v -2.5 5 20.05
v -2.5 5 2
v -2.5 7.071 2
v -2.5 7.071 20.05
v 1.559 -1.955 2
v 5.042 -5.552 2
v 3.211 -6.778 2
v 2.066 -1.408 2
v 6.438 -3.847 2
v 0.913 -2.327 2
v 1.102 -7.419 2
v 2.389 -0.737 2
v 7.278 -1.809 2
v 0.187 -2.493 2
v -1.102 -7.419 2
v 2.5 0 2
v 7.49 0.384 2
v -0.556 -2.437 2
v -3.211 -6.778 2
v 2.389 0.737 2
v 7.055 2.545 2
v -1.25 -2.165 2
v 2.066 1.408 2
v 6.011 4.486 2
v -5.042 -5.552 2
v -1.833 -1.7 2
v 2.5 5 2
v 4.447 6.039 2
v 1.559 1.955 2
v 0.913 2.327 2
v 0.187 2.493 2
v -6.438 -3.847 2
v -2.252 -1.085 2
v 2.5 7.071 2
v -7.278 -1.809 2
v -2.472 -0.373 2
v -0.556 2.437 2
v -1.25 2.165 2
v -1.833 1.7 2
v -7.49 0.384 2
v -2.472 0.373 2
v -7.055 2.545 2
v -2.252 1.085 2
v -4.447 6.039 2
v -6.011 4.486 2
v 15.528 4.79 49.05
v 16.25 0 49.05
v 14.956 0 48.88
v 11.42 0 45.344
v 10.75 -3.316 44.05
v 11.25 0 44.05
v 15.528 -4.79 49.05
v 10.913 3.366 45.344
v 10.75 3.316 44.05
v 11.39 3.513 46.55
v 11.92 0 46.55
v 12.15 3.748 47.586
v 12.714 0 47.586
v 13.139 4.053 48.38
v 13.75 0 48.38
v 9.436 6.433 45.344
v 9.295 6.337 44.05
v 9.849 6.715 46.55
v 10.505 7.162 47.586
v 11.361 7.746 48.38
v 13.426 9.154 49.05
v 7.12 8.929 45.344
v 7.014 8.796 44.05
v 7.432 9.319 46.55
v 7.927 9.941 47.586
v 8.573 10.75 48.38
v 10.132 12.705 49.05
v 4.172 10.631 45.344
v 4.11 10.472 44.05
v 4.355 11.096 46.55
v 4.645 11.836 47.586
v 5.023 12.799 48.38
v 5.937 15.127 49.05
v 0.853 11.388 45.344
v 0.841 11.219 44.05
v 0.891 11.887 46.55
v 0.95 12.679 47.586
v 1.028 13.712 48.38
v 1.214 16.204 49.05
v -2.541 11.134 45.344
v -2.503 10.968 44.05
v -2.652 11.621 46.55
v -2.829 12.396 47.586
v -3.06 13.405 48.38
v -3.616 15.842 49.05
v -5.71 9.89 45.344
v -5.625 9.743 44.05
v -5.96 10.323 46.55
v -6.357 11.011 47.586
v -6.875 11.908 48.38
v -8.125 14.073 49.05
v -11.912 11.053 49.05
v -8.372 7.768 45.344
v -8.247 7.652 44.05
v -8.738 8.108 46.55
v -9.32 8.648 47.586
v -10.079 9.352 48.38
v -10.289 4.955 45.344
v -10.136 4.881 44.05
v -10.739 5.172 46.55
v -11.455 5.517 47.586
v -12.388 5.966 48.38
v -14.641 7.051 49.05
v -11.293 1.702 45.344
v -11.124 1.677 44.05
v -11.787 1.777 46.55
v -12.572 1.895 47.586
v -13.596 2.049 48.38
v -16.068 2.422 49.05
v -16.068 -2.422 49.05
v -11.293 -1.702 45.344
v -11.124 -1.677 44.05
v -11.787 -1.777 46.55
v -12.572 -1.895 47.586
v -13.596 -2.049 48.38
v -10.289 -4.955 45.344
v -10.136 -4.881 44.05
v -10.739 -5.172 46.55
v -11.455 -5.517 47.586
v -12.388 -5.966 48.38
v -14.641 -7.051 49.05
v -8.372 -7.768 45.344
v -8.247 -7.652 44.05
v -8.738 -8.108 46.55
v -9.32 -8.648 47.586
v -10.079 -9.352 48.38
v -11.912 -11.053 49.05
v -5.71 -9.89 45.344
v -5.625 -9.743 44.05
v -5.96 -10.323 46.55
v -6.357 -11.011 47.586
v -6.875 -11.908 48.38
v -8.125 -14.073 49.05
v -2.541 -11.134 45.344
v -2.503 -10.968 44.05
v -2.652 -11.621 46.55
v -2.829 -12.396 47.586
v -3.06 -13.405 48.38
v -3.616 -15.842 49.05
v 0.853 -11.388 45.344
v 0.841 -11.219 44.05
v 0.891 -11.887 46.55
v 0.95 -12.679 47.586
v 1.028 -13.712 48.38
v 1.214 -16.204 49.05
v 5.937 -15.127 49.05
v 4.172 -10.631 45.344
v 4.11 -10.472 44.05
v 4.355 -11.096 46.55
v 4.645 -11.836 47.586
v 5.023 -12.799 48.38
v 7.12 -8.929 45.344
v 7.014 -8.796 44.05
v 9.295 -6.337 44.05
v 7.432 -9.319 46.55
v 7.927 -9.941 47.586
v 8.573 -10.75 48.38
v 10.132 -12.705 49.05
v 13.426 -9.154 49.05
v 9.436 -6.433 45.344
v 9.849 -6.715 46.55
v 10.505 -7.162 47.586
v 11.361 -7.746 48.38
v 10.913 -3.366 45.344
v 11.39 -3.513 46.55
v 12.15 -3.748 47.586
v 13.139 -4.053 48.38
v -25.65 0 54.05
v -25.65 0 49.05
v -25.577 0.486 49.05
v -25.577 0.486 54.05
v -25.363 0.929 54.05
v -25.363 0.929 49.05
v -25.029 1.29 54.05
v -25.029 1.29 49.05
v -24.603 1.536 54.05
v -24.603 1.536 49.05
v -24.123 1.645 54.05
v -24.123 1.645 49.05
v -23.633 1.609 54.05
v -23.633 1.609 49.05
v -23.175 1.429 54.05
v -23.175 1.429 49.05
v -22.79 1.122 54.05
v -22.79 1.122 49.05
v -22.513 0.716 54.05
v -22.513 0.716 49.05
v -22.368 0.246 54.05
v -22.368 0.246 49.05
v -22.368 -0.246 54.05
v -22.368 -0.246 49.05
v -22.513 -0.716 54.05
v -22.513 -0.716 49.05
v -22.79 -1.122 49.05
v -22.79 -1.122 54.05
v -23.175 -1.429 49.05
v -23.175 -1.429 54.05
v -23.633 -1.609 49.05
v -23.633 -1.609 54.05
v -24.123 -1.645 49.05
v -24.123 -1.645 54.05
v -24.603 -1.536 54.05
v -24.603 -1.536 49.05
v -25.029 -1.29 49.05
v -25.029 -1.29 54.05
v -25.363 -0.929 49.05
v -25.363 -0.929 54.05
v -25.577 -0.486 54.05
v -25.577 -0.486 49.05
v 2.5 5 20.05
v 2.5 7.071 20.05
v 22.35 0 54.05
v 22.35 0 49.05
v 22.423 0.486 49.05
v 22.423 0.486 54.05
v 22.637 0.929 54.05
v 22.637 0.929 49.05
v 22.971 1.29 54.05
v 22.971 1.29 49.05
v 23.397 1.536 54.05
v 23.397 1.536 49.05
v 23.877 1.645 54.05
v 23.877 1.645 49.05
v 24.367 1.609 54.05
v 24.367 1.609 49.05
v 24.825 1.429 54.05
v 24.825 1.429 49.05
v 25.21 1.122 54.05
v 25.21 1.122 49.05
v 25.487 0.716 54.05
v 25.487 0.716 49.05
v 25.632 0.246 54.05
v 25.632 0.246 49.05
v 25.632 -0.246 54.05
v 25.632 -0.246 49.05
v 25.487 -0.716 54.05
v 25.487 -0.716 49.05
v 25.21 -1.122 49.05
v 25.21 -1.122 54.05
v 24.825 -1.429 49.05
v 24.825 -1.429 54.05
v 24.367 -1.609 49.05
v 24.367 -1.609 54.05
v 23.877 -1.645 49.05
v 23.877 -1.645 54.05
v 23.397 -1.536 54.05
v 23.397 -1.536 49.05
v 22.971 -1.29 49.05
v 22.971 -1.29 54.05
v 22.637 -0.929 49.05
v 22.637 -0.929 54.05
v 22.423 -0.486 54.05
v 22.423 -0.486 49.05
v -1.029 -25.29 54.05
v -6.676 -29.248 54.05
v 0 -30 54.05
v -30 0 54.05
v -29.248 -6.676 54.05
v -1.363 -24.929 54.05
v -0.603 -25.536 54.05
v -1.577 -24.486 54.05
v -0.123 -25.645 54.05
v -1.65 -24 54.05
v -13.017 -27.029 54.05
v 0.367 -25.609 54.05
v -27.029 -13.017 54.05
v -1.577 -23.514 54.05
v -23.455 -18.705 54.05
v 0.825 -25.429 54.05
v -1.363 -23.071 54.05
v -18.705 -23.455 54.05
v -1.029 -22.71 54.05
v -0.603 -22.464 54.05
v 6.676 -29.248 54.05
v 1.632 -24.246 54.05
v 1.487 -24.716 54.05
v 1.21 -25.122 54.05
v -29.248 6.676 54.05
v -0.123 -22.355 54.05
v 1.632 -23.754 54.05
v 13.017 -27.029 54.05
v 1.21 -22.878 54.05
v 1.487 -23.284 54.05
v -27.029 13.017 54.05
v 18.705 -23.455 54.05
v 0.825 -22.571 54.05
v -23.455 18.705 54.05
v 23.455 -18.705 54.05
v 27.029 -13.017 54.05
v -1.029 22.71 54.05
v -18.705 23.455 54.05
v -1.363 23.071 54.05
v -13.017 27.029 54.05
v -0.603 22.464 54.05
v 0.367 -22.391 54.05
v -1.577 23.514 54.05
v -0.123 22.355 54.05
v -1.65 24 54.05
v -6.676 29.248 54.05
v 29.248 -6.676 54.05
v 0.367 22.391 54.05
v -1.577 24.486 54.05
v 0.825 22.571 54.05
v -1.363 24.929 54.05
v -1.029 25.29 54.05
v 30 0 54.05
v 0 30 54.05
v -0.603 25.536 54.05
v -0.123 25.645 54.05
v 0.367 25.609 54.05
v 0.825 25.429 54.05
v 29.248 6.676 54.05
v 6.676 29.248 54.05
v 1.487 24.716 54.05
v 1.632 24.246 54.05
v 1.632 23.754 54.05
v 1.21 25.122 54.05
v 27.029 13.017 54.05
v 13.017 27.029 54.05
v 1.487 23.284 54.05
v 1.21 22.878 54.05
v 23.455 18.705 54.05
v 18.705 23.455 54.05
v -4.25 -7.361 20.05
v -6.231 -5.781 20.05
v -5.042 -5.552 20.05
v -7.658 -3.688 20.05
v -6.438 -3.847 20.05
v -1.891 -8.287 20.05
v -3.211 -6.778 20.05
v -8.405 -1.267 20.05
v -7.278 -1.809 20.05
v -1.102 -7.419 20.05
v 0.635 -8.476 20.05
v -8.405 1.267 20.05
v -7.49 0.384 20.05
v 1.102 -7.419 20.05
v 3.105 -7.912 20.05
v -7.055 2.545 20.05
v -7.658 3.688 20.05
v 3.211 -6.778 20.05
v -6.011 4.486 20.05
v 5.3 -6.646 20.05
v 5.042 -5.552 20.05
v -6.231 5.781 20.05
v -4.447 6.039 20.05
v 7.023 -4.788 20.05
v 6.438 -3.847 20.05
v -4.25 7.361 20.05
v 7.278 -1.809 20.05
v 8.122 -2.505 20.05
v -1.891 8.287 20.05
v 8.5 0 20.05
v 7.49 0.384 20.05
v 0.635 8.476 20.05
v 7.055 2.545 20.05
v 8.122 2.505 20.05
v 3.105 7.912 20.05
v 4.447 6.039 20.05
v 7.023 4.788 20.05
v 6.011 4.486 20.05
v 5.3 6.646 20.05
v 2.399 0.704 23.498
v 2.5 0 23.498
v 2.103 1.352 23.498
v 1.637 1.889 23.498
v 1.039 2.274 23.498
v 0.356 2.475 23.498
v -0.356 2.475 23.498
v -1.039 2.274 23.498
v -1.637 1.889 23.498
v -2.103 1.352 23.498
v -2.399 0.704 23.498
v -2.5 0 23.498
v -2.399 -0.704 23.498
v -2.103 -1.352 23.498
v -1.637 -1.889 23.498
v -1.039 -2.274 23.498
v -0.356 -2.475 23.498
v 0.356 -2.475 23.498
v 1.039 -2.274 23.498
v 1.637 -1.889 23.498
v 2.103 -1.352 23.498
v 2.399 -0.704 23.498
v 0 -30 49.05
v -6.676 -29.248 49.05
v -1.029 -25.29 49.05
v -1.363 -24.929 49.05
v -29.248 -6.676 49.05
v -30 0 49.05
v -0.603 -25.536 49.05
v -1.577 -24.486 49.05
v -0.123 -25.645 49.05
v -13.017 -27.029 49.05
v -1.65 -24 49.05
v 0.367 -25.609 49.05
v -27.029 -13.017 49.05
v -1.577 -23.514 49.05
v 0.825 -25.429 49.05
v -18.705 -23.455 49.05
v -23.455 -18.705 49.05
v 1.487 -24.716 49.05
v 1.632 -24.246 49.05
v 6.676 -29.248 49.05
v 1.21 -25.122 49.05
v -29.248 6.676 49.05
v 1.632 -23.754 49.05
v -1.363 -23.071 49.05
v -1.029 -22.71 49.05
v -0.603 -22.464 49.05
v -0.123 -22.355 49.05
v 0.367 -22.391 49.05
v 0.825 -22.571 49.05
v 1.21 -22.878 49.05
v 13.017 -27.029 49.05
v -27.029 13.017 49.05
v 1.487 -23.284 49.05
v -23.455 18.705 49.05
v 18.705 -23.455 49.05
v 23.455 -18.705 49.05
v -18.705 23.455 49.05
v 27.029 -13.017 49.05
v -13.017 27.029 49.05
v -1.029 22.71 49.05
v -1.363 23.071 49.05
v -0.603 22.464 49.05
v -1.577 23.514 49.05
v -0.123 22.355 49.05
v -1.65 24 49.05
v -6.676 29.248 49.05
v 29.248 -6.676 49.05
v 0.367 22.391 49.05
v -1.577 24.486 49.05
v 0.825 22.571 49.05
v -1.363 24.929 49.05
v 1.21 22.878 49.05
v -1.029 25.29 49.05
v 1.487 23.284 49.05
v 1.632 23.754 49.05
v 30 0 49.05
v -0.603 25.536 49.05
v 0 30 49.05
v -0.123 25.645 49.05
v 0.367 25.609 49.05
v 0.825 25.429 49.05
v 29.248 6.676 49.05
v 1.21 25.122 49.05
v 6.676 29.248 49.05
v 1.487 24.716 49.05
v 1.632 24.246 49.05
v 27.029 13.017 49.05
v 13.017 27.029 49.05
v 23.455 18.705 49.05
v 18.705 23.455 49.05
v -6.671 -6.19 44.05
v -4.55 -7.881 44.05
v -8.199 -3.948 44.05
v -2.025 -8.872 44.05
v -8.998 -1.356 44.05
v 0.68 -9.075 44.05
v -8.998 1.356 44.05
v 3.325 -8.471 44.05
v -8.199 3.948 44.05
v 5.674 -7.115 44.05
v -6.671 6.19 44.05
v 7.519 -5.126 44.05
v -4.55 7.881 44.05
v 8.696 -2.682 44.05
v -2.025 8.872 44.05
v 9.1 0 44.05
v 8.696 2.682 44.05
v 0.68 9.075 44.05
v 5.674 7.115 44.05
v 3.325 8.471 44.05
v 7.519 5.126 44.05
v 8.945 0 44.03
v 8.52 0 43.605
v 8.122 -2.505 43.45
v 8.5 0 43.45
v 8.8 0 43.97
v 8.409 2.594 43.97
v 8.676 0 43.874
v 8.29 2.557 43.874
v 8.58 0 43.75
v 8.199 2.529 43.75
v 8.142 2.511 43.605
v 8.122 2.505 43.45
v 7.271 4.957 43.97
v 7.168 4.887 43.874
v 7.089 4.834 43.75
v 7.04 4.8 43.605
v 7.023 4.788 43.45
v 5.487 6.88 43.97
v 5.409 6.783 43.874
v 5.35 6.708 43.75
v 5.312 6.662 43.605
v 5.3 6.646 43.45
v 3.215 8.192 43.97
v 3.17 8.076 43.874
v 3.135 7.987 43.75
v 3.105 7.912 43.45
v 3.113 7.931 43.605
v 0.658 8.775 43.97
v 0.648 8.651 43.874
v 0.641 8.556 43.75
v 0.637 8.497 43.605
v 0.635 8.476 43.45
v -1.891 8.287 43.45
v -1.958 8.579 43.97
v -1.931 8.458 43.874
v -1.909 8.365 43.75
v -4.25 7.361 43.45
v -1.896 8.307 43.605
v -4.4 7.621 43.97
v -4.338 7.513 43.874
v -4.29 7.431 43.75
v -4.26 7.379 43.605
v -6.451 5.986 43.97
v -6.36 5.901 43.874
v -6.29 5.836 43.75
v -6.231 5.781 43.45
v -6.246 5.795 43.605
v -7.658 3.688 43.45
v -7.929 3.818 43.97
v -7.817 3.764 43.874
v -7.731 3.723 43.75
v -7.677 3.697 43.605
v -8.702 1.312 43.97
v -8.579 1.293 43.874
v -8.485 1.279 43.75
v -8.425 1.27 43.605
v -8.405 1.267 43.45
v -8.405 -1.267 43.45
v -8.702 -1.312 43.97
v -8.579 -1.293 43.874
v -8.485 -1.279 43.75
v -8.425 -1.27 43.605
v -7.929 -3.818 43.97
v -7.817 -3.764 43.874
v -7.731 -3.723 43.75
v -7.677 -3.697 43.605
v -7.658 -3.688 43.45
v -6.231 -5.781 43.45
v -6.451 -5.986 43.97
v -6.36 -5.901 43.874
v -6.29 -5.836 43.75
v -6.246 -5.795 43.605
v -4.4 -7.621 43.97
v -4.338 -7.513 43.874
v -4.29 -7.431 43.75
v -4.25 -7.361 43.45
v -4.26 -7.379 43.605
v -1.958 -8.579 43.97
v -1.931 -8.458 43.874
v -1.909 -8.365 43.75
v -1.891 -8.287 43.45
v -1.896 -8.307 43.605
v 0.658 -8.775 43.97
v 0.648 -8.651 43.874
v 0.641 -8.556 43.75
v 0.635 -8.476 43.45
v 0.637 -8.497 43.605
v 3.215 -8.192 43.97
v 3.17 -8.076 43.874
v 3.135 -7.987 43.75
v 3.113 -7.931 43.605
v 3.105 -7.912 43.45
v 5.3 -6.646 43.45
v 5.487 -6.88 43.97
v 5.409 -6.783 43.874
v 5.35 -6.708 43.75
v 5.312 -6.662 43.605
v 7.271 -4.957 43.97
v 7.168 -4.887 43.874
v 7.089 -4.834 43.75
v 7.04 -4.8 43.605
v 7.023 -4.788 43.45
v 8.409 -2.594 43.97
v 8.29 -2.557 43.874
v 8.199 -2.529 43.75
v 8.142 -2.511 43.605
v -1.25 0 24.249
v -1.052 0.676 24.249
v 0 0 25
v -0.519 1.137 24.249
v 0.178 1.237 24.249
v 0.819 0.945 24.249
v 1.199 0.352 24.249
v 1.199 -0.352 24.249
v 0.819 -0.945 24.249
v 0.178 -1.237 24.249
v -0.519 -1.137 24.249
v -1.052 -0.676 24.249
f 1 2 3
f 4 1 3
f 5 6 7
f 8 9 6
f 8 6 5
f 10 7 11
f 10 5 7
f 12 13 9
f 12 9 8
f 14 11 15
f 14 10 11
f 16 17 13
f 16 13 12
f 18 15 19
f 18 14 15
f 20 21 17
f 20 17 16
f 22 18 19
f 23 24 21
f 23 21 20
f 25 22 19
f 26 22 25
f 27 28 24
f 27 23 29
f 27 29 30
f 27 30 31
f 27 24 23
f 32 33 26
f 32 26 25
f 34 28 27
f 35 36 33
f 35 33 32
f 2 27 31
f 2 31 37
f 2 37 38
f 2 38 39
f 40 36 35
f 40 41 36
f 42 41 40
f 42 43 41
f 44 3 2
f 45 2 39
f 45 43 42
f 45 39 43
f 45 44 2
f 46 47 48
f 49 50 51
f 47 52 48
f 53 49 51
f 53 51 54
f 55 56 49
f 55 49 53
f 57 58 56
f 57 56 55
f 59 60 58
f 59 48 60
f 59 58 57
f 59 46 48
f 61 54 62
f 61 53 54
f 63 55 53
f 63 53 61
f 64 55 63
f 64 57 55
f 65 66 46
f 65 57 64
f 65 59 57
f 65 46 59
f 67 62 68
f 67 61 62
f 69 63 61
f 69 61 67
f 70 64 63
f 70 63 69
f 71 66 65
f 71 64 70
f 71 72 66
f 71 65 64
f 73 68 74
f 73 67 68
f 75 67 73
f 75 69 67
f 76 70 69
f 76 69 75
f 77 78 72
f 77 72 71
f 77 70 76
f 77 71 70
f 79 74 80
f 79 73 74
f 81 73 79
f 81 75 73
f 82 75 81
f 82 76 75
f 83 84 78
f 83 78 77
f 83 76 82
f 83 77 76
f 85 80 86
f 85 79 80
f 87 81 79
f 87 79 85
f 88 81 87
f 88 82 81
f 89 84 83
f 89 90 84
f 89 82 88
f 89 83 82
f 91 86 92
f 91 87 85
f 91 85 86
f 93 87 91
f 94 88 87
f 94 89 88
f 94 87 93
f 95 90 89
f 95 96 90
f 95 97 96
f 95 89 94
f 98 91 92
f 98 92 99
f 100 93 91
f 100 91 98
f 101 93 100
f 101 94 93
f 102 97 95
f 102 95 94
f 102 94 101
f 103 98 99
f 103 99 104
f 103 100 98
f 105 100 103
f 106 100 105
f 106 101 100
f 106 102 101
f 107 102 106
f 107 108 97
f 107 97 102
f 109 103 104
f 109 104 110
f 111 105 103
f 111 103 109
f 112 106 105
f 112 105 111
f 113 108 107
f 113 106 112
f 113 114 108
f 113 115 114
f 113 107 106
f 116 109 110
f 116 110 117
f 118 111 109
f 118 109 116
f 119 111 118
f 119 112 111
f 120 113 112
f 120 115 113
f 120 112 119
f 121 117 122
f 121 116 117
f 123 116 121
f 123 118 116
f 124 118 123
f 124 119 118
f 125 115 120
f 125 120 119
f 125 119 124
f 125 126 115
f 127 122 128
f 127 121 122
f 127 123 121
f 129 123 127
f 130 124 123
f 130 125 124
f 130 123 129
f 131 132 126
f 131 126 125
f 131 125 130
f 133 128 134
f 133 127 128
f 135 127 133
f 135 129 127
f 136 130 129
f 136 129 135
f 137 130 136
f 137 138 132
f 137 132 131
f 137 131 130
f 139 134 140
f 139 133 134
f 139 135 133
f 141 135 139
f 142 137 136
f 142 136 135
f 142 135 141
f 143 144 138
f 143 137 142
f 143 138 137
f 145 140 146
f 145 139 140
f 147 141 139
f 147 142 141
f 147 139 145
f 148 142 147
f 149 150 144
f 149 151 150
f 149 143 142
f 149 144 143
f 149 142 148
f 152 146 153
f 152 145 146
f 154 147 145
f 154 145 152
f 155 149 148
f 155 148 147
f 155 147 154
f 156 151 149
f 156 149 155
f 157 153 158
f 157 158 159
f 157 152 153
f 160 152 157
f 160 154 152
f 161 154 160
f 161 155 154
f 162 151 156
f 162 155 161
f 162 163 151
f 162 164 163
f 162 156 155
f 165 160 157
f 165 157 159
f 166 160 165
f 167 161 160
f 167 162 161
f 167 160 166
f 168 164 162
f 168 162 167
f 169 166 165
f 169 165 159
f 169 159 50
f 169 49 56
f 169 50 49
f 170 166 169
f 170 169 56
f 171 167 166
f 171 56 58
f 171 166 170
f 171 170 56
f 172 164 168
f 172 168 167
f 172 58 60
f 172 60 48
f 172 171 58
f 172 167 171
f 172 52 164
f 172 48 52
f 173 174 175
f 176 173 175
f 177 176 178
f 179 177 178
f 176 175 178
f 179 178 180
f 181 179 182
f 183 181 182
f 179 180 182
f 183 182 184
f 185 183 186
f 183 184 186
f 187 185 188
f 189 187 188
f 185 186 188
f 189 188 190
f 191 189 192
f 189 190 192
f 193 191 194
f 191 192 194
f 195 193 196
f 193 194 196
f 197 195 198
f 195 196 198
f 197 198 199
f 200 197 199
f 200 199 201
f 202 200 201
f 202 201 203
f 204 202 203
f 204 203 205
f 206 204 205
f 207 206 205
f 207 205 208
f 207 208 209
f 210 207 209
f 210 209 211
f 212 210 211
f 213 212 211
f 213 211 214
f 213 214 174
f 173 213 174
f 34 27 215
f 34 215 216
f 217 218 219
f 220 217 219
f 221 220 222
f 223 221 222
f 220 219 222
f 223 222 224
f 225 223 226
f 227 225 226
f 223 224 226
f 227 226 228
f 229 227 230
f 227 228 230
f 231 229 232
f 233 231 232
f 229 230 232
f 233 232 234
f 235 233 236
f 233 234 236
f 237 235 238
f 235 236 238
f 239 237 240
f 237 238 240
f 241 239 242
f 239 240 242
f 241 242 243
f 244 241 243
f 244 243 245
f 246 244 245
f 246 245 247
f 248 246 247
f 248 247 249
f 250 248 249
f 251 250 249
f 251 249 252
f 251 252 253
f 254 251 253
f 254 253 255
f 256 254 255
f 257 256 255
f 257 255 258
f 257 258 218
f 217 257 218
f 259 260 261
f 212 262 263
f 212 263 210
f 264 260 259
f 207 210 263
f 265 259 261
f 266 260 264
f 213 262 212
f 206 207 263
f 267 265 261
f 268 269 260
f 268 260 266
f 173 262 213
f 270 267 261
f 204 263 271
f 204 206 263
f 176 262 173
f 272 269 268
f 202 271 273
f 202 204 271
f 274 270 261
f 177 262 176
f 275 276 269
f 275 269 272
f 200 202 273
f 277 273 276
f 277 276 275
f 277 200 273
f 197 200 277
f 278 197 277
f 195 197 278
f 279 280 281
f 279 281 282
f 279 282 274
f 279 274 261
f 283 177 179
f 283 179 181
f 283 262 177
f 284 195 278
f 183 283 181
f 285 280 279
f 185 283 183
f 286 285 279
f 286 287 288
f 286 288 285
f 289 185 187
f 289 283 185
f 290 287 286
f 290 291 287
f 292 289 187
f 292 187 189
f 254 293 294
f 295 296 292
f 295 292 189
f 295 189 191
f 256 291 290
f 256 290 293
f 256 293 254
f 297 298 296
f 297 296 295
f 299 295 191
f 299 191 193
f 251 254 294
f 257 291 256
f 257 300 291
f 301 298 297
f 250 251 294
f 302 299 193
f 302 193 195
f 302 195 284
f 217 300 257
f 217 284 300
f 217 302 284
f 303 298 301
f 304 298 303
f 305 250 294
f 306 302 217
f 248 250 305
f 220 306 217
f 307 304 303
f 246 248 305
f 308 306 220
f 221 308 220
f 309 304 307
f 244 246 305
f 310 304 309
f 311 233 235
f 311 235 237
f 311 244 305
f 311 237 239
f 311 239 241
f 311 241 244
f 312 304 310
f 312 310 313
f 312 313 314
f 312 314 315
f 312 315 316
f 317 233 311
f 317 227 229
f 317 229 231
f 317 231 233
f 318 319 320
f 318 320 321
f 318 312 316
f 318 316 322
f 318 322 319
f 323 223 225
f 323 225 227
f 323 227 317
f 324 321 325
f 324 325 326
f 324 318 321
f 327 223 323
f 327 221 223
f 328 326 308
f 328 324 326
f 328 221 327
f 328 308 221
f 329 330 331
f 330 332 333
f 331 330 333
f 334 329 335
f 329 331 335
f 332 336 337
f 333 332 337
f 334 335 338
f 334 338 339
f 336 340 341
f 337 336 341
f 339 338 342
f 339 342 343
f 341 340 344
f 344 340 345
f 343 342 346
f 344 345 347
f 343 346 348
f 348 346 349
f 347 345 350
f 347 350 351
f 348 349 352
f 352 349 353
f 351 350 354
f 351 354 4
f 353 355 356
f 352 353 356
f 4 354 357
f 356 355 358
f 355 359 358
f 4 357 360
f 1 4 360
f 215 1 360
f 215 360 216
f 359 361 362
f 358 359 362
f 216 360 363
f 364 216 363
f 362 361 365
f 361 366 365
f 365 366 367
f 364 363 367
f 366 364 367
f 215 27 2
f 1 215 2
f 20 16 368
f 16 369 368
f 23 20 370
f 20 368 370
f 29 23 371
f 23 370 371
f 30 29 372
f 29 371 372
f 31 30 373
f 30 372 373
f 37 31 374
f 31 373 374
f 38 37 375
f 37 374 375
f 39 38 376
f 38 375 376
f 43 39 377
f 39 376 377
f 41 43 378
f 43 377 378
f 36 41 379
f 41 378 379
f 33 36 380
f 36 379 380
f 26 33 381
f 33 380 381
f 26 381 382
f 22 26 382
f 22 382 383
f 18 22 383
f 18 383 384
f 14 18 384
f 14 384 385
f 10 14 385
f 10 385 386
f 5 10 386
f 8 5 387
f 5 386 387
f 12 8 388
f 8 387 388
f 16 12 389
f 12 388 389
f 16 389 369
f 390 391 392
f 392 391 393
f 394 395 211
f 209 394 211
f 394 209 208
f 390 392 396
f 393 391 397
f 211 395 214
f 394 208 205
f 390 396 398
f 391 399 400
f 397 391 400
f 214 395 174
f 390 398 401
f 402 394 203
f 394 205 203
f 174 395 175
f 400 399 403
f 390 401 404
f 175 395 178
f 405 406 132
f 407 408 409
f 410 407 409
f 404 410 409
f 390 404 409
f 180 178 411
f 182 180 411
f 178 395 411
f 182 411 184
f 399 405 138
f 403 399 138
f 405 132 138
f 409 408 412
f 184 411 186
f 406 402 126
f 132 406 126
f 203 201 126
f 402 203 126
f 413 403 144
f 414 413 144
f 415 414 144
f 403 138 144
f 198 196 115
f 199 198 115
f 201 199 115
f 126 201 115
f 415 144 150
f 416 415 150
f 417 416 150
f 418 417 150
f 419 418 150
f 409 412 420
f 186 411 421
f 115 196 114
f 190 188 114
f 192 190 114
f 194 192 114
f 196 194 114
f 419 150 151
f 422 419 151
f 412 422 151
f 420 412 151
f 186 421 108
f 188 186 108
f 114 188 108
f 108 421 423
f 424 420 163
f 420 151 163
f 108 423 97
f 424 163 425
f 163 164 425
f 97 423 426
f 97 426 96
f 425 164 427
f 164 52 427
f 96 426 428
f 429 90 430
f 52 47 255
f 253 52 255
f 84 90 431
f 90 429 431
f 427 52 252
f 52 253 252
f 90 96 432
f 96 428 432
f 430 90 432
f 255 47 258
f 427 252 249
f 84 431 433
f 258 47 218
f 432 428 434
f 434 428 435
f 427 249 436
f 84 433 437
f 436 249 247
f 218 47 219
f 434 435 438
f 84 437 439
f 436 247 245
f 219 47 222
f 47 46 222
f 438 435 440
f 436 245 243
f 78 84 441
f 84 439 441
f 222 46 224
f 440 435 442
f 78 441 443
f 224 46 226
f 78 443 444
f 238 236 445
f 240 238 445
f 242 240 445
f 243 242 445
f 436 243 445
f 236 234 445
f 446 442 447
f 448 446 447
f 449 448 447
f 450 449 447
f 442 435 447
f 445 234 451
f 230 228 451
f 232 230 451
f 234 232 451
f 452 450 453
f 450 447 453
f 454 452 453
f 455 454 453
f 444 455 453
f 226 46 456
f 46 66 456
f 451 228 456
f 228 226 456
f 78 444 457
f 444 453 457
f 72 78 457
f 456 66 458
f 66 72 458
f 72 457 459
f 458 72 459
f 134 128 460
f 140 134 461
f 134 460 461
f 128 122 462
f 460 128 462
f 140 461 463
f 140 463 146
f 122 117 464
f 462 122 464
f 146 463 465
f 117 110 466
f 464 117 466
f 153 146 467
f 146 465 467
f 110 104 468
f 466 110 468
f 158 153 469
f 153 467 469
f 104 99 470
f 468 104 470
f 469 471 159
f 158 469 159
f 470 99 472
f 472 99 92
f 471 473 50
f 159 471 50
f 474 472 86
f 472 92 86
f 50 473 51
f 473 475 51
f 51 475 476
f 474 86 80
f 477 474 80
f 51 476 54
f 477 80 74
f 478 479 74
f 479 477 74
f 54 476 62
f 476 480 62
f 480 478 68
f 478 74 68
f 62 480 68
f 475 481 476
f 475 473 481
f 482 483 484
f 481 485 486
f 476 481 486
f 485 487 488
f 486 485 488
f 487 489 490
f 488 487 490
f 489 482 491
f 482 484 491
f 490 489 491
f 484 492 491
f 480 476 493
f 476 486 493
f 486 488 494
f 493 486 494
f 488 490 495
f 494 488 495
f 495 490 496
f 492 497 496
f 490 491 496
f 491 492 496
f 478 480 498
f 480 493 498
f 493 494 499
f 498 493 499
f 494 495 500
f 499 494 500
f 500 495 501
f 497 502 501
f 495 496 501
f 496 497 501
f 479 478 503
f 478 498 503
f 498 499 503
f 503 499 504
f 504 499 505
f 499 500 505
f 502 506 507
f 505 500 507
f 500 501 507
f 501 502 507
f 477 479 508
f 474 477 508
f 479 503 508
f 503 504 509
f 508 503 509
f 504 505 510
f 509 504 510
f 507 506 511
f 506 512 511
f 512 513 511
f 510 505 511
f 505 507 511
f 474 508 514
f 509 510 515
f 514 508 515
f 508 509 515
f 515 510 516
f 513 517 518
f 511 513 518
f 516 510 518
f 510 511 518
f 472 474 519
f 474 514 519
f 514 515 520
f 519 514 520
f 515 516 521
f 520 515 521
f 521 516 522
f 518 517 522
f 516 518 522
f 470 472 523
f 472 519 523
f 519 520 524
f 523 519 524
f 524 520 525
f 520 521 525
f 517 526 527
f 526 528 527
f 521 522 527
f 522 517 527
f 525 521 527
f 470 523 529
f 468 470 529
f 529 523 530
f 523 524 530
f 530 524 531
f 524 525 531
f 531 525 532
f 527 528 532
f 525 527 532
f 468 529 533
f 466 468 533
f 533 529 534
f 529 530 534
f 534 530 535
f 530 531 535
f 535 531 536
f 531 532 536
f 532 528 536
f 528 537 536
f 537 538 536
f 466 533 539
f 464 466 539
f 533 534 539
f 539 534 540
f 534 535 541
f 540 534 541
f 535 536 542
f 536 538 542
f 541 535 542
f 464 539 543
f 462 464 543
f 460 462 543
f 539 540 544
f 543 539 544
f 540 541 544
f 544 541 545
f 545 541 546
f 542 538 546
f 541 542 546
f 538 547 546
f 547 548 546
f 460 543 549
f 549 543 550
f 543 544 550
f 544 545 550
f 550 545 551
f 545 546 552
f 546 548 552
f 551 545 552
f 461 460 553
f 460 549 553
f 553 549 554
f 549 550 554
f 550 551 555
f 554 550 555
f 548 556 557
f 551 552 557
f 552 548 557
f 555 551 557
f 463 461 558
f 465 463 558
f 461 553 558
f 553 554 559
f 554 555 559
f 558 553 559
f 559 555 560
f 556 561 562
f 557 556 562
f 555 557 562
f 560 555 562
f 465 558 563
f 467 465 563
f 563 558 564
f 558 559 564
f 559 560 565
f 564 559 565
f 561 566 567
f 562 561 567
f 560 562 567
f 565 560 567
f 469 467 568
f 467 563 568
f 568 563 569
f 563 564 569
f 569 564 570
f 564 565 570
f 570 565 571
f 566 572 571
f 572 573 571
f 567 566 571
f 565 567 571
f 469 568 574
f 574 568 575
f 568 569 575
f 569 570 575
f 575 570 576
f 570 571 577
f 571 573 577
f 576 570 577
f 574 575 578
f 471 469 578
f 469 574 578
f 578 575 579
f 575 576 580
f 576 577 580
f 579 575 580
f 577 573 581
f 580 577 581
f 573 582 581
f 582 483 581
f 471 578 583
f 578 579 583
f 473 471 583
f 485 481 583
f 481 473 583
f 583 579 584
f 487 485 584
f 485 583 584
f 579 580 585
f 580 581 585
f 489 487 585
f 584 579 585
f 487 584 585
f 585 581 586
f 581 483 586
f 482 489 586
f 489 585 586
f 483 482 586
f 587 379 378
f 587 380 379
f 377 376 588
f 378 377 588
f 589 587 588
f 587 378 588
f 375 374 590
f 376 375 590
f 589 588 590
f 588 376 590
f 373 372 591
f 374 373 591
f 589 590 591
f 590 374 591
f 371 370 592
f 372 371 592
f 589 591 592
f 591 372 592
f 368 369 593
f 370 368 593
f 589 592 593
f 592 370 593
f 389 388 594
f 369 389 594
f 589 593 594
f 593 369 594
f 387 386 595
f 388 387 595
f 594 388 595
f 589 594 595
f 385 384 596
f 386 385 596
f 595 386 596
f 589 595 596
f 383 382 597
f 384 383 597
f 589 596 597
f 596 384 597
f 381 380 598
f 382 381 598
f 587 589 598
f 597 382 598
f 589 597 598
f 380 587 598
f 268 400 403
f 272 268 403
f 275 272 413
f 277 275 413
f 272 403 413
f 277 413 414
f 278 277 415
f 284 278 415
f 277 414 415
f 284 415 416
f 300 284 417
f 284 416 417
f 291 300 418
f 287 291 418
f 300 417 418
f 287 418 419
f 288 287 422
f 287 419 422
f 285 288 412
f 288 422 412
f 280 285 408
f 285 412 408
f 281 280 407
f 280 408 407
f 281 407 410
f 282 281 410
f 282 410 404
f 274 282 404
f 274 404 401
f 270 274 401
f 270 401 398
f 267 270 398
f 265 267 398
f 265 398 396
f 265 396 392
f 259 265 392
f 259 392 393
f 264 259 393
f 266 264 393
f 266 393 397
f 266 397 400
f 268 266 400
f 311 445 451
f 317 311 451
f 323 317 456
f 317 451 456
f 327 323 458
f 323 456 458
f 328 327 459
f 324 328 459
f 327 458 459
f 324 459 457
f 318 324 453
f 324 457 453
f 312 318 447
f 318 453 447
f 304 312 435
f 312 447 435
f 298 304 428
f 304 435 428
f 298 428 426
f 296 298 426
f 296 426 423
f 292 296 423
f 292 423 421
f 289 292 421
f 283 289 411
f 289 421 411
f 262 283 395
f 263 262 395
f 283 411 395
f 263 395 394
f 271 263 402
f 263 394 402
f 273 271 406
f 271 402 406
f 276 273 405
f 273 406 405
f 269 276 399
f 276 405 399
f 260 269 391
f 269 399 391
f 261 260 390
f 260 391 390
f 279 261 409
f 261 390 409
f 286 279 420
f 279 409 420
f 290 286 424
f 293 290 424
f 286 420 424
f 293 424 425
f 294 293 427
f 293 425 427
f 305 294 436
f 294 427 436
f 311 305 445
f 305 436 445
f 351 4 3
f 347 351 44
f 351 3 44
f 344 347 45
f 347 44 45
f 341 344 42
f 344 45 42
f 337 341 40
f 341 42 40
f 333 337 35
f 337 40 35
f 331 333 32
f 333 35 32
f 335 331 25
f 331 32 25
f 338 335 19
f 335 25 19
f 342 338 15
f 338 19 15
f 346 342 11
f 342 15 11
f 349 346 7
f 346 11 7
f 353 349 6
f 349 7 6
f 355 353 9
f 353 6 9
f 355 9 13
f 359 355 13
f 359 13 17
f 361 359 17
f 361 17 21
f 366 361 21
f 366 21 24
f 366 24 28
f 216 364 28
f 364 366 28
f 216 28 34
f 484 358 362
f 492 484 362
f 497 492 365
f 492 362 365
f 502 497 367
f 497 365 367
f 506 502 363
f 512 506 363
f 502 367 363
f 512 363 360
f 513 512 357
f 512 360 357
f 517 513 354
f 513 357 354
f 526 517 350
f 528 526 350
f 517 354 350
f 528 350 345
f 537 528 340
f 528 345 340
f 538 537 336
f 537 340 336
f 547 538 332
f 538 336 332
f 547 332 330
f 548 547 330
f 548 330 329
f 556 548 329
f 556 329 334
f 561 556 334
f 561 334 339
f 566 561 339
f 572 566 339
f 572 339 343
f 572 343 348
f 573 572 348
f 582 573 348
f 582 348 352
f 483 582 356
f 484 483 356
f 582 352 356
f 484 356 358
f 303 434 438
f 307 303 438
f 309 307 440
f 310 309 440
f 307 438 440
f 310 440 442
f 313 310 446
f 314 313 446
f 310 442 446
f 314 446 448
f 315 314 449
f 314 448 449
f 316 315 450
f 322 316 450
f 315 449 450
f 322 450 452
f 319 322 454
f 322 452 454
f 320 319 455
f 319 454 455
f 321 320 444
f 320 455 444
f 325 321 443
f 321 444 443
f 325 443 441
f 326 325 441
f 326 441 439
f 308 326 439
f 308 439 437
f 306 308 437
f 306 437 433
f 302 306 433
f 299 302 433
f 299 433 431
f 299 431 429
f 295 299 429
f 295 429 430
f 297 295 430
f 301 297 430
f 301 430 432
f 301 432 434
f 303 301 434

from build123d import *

# Parameters (mm, degrees)
SKETCH1_R                 = 7.5
BOSS_EXTRUDE1_DEPTH       = 20.05
SKETCH3_W                 = 5
SKETCH3_H                 = 5
CUT_EXTRUDE1_DEPTH        = 21
SKETCH6_R                 = 8.5
BOSS_EXTRUDE2_DEPTH       = 24
SKETCH7_R                 = 11.25
BOSS_EXTRUDE3_DEPTH       = 5
SKETCH8_R                 = 30
BOSS_EXTRUDE4_DEPTH       = 5
FILLET1_R                 = 0.6
FILLET2_R                 = 5
M4X0_7_TAPPED_HOLE1_D     = 3.3
M6X1_0_TAPPED_HOLE2_D     = 5
M6X1_0_TAPPED_HOLE2_DEPTH = 23.497848452
M6X1_0_TAPPED_HOLE2_TIP   = 1.502151548
SKETCH13_R                = 7.5
CUT_EXTRUDE2_DEPTH        = 2


with BuildPart() as part:
    # Sketch1 → Boss-Extrude1 (new body)
    with BuildSketch(Plane.XY):
        Circle(SKETCH1_R)
    extrude(amount=BOSS_EXTRUDE1_DEPTH)

    # Sketch3 → Cut-Extrude1 (cut)
    with BuildSketch(Plane(origin=(0, 0, 0), x_dir=(-1, 0, 0), z_dir=(0, 0, -1))):
        with Locations((0, 7.5)):
            Rectangle(SKETCH3_W, SKETCH3_H)
    extrude(amount=-CUT_EXTRUDE1_DEPTH, mode=Mode.SUBTRACT)

    # Sketch6 → Boss-Extrude2 (add)
    with BuildSketch(Plane.XY.offset(20.05)):
        Circle(SKETCH6_R)
    extrude(amount=BOSS_EXTRUDE2_DEPTH)

    # Sketch7 → Boss-Extrude3 (add)
    with BuildSketch(Plane.XY.offset(44.05)):
        Circle(SKETCH7_R)
    extrude(amount=BOSS_EXTRUDE3_DEPTH)

    # Sketch8 → Boss-Extrude4 (add)
    with BuildSketch(Plane.XY.offset(49.05)):
        Circle(SKETCH8_R)
    extrude(amount=BOSS_EXTRUDE4_DEPTH)

    # Fillet1
    fillet1_edges = [part.edges().sort_by_distance(p)[0] for p in [
        (-8.5, 0, 44.05),
    ]]
    fillet(fillet1_edges, radius=FILLET1_R)

    # Fillet2
    fillet2_edges = [part.edges().sort_by_distance(p)[0] for p in [
        (-11.25, 0, 49.05),
    ]]
    fillet(fillet2_edges, radius=FILLET2_R - 0.0001)  # a hair under: the kernel refuses the full size

    # M4x0.7 Tapped Hole1 (through all)
    with Locations(Plane.XY.offset(54.05)):
        with Locations((0, 24), (0, -24), (24, 0), (-24, 0)):
            Hole(M4X0_7_TAPPED_HOLE1_D / 2)

    # M6x1.0 Tapped Hole2
    with Locations(Plane(origin=(0, 0, 0), x_dir=(-1, 0, 0), z_dir=(0, 0, -1))):
        with Locations((0, 0)):
            Hole(M6X1_0_TAPPED_HOLE2_D / 2, depth=M6X1_0_TAPPED_HOLE2_DEPTH)
            with Locations((0, 0, -(M6X1_0_TAPPED_HOLE2_DEPTH + M6X1_0_TAPPED_HOLE2_TIP / 2))):  # 118° drill point
                Cone(0, M6X1_0_TAPPED_HOLE2_D / 2, M6X1_0_TAPPED_HOLE2_TIP, mode=Mode.SUBTRACT)

    # Sketch13 → Cut-Extrude2 (cut)
    with BuildSketch(Plane(origin=(0, 0, 0), x_dir=(-1, 0, 0), z_dir=(0, 0, -1))):
        Circle(SKETCH13_R)
    extrude(amount=-CUT_EXTRUDE2_DEPTH, mode=Mode.SUBTRACT)


solid = part.part
